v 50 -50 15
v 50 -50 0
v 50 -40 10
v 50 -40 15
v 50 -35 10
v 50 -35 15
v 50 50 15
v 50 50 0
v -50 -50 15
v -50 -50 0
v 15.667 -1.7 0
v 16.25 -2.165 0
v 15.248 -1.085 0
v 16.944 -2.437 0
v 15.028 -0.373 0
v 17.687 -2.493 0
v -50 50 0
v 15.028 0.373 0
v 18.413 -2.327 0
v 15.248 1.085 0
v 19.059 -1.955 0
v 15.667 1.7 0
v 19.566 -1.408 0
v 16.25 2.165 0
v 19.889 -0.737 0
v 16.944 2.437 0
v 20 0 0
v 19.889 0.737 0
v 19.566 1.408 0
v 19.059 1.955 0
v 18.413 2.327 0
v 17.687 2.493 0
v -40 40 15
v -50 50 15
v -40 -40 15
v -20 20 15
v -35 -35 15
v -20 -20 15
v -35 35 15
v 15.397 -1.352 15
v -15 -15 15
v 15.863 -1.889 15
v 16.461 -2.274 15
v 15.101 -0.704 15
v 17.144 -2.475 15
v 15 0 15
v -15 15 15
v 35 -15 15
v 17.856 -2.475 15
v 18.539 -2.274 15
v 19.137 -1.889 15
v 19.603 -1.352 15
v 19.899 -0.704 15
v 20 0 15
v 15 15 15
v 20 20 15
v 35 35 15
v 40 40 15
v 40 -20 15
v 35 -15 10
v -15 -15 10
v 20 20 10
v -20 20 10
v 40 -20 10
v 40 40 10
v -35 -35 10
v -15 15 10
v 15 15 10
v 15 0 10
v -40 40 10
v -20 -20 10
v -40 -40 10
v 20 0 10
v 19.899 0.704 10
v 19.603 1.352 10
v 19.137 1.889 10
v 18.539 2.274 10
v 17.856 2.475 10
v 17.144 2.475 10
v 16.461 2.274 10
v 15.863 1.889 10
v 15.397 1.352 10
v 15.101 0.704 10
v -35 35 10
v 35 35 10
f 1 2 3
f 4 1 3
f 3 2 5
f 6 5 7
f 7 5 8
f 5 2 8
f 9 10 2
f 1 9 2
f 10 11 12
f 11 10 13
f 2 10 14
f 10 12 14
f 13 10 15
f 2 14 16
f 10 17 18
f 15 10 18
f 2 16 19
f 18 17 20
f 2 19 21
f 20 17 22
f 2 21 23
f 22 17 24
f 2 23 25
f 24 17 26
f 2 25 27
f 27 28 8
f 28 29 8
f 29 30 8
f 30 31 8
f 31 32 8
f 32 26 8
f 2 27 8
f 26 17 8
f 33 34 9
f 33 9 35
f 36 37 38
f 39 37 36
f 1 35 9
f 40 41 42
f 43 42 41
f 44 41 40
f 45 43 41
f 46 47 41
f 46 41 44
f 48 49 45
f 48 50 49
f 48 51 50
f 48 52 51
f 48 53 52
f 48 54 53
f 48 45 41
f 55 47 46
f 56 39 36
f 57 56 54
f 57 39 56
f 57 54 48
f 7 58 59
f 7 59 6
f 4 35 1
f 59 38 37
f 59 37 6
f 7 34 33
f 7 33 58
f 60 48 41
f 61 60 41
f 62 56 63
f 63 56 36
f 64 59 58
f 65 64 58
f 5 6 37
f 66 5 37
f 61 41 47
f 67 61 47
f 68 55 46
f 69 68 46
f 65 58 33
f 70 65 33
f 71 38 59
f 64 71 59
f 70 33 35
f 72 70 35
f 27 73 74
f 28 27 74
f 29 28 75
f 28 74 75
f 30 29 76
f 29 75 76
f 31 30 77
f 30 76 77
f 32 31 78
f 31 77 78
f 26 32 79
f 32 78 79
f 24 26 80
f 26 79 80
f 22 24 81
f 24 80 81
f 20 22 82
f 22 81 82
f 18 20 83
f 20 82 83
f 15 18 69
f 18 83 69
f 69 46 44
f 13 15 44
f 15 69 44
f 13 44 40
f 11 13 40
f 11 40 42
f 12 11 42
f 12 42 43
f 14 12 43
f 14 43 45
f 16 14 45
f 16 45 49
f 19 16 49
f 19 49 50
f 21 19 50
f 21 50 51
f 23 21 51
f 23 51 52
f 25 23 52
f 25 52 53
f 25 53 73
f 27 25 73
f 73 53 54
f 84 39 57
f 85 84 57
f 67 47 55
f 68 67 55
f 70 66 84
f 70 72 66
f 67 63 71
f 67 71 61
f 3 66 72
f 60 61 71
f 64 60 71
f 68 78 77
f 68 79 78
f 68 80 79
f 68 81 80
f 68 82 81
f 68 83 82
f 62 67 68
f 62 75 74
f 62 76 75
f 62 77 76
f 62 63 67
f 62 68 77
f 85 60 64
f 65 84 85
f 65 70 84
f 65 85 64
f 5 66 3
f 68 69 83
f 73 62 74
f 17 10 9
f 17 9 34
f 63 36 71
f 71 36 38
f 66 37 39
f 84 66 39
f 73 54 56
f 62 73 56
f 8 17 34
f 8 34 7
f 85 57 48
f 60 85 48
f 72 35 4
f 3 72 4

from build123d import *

# Parameters (mm, degrees)
F0_W     = 100
F0_H     = 100
F1_DEPTH = 15
F3_DEPTH = 5
F4_R     = 2.5
F5_DEPTH = 15.001


with BuildPart() as f1:
    # F0 (on Top) → F1 (new body)
    with BuildSketch(Plane.XY):
        Rectangle(F0_W, F0_H)
    extrude(amount=F1_DEPTH)

    # F2 (on face) → F3 (cut)
    with BuildSketch(Plane.XY.offset(15)):
        Polygon((-40, -40), (50, -40), (50, -35), (-35, -35), (-35, 35), (35, 35), (35, -15), (-15, -15), (-15, 15), (15, 15), (15, 0), (20, 0), (20, 20), (-20, 20), (-20, -20), (40, -20), (40, 40), (-40, 40), align=None)
    extrude(amount=-F3_DEPTH, mode=Mode.SUBTRACT)

    # F4 (on face) → F5 (cut, through all)
    with BuildSketch(Plane.XY.offset(15)):
        with Locations((17.5, 0)):
            Circle(F4_R)
    extrude(amount=-F5_DEPTH, mode=Mode.SUBTRACT)


solid = f1.part
